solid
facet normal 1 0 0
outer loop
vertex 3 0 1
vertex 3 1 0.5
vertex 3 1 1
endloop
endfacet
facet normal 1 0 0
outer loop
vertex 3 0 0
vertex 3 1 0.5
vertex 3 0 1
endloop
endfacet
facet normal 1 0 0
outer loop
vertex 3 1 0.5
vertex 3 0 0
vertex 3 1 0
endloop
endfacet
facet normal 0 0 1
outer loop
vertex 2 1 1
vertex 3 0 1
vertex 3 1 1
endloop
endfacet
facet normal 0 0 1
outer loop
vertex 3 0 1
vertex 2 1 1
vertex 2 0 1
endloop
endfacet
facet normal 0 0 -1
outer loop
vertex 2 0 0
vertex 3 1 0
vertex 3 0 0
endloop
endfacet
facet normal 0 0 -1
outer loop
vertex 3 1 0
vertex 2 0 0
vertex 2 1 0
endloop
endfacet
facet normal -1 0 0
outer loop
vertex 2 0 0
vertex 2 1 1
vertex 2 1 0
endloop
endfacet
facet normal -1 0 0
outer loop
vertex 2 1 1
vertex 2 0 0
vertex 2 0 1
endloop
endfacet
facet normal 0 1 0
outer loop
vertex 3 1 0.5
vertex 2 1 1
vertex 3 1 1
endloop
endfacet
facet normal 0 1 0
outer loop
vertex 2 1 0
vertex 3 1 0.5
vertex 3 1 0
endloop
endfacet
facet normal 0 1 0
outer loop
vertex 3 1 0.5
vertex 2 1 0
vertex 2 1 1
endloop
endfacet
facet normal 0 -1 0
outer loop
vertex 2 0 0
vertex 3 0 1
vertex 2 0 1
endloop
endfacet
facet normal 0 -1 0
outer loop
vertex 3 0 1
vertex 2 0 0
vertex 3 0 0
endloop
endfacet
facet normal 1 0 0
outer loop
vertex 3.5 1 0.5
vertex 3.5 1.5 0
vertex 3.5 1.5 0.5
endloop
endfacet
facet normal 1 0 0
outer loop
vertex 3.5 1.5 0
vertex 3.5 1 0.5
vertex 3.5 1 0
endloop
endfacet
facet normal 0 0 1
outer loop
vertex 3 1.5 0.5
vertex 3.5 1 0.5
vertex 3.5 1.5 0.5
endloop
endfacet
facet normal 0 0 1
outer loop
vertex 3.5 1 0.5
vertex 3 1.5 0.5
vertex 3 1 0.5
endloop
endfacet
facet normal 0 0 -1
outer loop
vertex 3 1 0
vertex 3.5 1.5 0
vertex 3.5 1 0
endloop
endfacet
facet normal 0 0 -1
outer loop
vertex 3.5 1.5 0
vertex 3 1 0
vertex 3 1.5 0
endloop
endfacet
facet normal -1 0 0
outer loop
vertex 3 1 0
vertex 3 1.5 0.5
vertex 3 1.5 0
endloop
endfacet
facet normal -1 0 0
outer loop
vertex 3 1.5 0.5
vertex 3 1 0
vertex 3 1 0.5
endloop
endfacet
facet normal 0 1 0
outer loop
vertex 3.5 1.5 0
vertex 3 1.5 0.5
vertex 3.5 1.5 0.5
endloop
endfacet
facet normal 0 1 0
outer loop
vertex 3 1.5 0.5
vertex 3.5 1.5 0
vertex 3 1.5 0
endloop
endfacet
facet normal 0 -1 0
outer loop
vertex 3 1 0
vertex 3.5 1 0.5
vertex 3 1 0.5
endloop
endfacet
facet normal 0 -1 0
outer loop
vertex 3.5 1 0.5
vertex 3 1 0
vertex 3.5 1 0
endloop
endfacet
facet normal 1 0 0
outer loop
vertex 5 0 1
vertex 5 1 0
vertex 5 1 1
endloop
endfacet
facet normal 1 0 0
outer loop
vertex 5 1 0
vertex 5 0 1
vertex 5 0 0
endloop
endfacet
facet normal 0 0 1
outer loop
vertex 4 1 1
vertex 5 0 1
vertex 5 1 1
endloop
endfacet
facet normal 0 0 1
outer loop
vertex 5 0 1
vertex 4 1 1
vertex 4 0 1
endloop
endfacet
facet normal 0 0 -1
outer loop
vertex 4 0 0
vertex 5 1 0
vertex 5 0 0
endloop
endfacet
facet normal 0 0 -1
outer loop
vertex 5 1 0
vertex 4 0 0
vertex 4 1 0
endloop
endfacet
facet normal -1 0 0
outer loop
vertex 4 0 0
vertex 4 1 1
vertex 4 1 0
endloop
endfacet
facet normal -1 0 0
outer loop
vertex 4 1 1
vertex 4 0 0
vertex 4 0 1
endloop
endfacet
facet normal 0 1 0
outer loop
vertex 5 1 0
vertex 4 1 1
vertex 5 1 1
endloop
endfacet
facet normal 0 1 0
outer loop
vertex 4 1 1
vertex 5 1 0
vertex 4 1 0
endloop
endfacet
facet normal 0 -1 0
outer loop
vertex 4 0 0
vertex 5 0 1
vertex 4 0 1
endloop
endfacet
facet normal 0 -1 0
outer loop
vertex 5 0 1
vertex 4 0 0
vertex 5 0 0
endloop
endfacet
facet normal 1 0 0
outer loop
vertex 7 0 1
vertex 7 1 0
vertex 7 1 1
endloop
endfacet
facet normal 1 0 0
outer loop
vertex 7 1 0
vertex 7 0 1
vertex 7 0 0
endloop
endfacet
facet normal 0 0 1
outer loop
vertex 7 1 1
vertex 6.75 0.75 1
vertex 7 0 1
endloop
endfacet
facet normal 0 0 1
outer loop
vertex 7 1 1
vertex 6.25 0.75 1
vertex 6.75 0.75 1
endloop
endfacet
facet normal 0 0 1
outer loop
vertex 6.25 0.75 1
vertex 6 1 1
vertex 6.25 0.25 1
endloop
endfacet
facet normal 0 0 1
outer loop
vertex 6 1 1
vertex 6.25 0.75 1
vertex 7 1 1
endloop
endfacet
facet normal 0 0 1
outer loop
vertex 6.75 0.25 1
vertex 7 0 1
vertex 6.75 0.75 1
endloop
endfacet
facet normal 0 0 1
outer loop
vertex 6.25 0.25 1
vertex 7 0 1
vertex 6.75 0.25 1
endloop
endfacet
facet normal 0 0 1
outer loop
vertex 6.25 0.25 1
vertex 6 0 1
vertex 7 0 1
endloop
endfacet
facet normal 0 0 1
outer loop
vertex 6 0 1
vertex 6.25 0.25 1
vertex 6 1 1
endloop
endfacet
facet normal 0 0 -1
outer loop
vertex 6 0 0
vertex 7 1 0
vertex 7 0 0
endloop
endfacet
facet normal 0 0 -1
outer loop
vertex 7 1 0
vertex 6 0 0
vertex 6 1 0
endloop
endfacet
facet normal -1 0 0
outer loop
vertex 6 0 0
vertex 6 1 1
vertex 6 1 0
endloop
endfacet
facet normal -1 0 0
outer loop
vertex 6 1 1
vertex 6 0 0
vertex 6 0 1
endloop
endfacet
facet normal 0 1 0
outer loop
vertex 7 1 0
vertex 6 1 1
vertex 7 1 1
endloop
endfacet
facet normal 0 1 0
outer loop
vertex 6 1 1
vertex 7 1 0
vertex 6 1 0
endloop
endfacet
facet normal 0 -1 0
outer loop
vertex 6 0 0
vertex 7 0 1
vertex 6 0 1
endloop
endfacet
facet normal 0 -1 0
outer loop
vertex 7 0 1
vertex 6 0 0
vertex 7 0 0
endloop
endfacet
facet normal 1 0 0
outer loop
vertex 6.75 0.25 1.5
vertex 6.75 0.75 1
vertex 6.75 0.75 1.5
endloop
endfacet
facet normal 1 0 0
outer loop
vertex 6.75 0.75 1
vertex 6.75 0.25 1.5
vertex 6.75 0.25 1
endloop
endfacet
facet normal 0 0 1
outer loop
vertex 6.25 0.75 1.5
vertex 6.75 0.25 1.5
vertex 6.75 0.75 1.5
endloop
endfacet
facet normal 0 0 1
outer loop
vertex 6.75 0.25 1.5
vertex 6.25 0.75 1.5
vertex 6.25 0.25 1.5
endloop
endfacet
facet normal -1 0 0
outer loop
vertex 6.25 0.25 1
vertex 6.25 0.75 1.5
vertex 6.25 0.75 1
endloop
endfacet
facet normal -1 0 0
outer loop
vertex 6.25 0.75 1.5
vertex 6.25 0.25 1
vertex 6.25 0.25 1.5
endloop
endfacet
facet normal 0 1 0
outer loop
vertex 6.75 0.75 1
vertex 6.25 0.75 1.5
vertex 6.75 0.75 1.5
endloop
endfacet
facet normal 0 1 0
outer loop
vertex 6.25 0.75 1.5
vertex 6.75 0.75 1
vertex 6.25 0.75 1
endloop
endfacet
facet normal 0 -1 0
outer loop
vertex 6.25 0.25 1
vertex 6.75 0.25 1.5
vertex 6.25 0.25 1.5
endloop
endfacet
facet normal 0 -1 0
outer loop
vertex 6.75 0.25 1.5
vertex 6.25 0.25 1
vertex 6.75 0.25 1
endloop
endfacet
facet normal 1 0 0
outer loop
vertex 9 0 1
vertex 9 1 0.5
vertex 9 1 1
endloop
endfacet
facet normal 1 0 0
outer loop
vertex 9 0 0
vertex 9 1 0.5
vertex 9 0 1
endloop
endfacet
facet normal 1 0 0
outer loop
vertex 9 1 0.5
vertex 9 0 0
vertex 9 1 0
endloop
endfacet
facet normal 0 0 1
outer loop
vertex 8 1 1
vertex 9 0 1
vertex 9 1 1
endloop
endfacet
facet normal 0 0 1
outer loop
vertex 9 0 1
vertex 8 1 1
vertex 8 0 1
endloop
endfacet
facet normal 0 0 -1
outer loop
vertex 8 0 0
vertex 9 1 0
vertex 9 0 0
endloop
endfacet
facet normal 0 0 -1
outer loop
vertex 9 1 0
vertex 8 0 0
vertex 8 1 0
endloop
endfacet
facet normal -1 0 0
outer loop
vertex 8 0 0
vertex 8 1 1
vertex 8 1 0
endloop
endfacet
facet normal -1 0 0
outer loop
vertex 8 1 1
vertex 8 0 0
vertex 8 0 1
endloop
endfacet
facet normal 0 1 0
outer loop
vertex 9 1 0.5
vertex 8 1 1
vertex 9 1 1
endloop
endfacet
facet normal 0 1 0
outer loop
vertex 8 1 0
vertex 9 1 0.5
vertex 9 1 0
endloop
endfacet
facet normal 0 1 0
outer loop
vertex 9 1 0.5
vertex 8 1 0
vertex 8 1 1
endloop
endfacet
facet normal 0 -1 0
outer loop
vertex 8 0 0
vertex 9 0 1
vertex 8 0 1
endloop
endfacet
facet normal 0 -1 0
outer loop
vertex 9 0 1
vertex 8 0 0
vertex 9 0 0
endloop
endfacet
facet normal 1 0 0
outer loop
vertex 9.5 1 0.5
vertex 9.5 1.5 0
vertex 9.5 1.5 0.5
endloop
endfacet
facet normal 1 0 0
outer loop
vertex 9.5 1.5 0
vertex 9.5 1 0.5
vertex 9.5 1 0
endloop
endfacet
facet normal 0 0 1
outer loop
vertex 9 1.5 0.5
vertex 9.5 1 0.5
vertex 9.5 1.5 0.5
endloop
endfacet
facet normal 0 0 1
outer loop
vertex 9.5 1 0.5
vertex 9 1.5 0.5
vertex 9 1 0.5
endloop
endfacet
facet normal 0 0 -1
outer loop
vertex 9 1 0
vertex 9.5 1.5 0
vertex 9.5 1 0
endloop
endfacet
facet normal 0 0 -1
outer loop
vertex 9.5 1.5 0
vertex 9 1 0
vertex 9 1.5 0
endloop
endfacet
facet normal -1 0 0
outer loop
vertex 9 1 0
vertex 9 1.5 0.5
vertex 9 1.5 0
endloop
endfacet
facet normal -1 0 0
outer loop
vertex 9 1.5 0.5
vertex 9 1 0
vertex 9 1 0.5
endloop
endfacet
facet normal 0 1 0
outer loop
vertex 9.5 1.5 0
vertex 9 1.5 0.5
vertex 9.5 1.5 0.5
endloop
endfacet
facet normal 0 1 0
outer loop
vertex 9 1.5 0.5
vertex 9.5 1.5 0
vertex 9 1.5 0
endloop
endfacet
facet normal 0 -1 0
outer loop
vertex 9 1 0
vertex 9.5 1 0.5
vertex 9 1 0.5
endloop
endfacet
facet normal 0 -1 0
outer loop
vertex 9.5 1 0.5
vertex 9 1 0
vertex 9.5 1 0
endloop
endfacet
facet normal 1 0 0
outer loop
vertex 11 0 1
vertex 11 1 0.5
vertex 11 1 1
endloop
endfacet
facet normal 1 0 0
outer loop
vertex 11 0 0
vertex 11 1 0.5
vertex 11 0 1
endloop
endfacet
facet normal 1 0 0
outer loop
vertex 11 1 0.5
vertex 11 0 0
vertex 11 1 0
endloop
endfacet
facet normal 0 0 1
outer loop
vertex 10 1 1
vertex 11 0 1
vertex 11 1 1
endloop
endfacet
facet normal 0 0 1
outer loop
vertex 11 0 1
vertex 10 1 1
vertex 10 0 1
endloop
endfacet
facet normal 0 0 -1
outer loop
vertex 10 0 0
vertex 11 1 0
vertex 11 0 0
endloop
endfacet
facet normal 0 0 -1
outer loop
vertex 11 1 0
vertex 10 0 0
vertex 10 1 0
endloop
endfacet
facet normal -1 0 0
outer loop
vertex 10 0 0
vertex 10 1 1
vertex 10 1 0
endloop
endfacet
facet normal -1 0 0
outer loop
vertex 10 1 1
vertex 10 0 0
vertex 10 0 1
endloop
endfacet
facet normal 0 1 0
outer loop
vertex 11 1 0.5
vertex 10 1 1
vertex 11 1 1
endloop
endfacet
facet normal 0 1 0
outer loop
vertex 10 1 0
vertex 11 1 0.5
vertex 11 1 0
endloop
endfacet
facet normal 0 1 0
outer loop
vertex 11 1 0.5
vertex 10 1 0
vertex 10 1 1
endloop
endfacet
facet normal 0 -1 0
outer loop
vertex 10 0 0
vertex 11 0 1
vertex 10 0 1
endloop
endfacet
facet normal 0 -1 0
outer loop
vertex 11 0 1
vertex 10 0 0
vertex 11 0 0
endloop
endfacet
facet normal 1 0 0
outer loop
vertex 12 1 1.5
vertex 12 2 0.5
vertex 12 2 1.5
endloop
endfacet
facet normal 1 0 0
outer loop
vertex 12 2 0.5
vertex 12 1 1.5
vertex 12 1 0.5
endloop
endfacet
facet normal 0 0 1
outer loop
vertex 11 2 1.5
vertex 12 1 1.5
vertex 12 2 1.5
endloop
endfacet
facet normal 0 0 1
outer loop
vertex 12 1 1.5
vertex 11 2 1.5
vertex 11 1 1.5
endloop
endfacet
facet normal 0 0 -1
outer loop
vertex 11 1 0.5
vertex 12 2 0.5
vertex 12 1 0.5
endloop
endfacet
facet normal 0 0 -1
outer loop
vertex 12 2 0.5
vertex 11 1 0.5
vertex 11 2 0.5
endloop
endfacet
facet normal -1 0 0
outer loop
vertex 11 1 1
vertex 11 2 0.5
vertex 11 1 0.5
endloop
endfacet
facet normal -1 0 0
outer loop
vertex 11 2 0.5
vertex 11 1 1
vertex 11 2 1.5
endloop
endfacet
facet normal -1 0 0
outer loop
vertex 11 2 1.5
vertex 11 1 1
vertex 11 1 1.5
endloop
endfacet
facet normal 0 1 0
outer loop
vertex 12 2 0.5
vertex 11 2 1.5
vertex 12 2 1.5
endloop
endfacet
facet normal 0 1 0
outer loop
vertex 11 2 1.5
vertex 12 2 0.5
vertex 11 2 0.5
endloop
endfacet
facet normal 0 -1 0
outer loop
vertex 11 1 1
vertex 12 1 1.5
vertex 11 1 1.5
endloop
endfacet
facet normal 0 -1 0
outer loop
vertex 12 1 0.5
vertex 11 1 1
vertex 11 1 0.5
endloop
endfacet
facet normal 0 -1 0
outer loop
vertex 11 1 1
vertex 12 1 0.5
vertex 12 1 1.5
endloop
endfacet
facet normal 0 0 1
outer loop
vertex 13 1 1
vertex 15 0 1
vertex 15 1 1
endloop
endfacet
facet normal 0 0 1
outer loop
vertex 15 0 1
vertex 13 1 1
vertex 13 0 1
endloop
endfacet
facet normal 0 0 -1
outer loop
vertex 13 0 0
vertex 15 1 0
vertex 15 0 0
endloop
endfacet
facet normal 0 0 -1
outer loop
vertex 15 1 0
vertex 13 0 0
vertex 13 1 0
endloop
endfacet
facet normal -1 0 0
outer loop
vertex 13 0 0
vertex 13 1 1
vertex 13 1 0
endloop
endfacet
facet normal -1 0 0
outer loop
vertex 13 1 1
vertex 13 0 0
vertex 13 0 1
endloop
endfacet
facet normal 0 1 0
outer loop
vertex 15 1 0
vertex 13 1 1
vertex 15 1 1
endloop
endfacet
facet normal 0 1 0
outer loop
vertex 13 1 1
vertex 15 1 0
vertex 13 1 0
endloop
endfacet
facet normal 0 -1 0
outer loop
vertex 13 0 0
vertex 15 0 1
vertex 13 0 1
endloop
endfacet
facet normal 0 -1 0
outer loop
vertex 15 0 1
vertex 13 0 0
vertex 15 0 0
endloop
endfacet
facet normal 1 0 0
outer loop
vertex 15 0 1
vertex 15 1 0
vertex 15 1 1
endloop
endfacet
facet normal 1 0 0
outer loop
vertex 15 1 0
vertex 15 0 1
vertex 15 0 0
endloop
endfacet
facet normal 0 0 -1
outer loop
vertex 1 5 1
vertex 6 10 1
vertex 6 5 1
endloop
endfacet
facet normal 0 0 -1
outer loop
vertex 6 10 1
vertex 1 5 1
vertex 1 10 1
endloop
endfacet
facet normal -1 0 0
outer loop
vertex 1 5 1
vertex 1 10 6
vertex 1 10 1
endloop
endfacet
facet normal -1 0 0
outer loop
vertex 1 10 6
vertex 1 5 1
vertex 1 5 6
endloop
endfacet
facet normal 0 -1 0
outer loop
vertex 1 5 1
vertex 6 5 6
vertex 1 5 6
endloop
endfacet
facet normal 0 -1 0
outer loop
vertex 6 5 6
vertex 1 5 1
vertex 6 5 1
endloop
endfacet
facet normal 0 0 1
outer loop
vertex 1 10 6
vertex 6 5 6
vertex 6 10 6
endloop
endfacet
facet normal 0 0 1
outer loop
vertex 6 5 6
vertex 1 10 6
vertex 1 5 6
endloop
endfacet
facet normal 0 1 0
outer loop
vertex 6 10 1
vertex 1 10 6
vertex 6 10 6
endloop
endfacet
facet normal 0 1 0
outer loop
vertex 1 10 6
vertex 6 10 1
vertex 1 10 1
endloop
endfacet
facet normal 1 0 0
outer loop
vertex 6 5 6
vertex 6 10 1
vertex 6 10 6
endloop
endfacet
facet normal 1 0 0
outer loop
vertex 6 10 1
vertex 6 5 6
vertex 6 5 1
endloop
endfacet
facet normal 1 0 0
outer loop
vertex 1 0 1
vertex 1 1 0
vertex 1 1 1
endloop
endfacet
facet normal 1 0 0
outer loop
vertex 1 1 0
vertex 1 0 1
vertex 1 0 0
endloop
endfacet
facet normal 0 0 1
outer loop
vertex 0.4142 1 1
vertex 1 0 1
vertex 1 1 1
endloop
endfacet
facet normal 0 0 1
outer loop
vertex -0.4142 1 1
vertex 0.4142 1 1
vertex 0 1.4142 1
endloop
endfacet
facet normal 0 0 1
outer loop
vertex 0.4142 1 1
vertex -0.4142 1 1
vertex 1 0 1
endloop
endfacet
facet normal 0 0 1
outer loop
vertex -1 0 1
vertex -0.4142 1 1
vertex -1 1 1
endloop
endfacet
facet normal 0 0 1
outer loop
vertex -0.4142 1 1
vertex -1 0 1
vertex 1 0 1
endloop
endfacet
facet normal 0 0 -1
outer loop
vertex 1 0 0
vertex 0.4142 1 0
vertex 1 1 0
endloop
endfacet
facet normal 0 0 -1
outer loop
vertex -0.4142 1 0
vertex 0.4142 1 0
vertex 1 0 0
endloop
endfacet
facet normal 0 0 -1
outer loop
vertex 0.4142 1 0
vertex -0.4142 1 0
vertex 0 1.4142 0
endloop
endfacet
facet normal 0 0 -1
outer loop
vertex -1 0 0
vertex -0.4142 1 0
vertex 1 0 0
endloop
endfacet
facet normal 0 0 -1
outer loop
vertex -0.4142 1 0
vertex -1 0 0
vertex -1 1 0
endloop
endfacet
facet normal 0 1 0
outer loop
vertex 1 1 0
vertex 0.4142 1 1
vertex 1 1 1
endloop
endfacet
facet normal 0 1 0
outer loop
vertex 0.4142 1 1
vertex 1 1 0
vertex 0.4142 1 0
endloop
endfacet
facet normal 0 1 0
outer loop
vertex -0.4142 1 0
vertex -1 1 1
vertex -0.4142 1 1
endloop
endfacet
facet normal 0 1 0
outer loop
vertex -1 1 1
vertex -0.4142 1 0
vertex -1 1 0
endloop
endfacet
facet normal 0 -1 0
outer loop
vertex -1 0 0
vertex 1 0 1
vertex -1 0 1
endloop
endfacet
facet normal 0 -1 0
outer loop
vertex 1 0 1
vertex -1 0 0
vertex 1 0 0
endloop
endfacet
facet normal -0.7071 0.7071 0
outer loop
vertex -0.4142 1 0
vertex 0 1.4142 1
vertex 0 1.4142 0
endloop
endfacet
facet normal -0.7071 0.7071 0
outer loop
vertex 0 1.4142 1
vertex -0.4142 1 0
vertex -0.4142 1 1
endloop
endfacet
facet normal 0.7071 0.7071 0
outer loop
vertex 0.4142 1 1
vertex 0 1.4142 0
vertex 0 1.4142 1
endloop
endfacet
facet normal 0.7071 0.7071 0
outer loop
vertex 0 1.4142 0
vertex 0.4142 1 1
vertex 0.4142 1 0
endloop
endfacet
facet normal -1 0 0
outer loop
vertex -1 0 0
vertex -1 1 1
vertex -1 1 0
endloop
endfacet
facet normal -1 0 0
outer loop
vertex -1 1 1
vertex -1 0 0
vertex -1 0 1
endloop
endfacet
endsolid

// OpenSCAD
// Volume: 135.54657238611156, SurfaceArea: 210.68628997398346
// These are cases where solids share edges or vertices, which can be challenging
// for some libraries used for rendering (e.g. corefinement functions in CGAL's
// polygon mesh processing package) and must be worked around by OpenSCAD.
N = 5;

cube(1);
rotate([0, 0, 45]) cube(1);
rotate([0, 0, 90]) cube(1);

translate([2, 0, 0]) {
  union() {
    cube(1);
    translate([1, 1, 0]) cube(0.5);
  }
}

translate([4, 0, 0]) {
  difference() {
    cube(1);
    translate([1, 1, 0]) cube(1);
  }
}

translate([6, 0, 0]) {
  cube(1);
  translate([0.25, 0.25, 1]) cube(0.5);
}

translate([8, 0, 0]) {
  cube(1);
  translate([1, 1, 0]) cube(0.5);
}

translate([10, 0, 0]) {
  cube(1);
  translate([1, 1, 0.5]) cube(1);
}

translate([13, 0, 0]) {
  cube(1);
  translate([1, 0, 0]) cube(1);
}

translate([0, 4, 0]) {
  union()
    for(i=[1:N], j=[1:N], k=[1:N])
      translate([i,j,k]) cube();
}
